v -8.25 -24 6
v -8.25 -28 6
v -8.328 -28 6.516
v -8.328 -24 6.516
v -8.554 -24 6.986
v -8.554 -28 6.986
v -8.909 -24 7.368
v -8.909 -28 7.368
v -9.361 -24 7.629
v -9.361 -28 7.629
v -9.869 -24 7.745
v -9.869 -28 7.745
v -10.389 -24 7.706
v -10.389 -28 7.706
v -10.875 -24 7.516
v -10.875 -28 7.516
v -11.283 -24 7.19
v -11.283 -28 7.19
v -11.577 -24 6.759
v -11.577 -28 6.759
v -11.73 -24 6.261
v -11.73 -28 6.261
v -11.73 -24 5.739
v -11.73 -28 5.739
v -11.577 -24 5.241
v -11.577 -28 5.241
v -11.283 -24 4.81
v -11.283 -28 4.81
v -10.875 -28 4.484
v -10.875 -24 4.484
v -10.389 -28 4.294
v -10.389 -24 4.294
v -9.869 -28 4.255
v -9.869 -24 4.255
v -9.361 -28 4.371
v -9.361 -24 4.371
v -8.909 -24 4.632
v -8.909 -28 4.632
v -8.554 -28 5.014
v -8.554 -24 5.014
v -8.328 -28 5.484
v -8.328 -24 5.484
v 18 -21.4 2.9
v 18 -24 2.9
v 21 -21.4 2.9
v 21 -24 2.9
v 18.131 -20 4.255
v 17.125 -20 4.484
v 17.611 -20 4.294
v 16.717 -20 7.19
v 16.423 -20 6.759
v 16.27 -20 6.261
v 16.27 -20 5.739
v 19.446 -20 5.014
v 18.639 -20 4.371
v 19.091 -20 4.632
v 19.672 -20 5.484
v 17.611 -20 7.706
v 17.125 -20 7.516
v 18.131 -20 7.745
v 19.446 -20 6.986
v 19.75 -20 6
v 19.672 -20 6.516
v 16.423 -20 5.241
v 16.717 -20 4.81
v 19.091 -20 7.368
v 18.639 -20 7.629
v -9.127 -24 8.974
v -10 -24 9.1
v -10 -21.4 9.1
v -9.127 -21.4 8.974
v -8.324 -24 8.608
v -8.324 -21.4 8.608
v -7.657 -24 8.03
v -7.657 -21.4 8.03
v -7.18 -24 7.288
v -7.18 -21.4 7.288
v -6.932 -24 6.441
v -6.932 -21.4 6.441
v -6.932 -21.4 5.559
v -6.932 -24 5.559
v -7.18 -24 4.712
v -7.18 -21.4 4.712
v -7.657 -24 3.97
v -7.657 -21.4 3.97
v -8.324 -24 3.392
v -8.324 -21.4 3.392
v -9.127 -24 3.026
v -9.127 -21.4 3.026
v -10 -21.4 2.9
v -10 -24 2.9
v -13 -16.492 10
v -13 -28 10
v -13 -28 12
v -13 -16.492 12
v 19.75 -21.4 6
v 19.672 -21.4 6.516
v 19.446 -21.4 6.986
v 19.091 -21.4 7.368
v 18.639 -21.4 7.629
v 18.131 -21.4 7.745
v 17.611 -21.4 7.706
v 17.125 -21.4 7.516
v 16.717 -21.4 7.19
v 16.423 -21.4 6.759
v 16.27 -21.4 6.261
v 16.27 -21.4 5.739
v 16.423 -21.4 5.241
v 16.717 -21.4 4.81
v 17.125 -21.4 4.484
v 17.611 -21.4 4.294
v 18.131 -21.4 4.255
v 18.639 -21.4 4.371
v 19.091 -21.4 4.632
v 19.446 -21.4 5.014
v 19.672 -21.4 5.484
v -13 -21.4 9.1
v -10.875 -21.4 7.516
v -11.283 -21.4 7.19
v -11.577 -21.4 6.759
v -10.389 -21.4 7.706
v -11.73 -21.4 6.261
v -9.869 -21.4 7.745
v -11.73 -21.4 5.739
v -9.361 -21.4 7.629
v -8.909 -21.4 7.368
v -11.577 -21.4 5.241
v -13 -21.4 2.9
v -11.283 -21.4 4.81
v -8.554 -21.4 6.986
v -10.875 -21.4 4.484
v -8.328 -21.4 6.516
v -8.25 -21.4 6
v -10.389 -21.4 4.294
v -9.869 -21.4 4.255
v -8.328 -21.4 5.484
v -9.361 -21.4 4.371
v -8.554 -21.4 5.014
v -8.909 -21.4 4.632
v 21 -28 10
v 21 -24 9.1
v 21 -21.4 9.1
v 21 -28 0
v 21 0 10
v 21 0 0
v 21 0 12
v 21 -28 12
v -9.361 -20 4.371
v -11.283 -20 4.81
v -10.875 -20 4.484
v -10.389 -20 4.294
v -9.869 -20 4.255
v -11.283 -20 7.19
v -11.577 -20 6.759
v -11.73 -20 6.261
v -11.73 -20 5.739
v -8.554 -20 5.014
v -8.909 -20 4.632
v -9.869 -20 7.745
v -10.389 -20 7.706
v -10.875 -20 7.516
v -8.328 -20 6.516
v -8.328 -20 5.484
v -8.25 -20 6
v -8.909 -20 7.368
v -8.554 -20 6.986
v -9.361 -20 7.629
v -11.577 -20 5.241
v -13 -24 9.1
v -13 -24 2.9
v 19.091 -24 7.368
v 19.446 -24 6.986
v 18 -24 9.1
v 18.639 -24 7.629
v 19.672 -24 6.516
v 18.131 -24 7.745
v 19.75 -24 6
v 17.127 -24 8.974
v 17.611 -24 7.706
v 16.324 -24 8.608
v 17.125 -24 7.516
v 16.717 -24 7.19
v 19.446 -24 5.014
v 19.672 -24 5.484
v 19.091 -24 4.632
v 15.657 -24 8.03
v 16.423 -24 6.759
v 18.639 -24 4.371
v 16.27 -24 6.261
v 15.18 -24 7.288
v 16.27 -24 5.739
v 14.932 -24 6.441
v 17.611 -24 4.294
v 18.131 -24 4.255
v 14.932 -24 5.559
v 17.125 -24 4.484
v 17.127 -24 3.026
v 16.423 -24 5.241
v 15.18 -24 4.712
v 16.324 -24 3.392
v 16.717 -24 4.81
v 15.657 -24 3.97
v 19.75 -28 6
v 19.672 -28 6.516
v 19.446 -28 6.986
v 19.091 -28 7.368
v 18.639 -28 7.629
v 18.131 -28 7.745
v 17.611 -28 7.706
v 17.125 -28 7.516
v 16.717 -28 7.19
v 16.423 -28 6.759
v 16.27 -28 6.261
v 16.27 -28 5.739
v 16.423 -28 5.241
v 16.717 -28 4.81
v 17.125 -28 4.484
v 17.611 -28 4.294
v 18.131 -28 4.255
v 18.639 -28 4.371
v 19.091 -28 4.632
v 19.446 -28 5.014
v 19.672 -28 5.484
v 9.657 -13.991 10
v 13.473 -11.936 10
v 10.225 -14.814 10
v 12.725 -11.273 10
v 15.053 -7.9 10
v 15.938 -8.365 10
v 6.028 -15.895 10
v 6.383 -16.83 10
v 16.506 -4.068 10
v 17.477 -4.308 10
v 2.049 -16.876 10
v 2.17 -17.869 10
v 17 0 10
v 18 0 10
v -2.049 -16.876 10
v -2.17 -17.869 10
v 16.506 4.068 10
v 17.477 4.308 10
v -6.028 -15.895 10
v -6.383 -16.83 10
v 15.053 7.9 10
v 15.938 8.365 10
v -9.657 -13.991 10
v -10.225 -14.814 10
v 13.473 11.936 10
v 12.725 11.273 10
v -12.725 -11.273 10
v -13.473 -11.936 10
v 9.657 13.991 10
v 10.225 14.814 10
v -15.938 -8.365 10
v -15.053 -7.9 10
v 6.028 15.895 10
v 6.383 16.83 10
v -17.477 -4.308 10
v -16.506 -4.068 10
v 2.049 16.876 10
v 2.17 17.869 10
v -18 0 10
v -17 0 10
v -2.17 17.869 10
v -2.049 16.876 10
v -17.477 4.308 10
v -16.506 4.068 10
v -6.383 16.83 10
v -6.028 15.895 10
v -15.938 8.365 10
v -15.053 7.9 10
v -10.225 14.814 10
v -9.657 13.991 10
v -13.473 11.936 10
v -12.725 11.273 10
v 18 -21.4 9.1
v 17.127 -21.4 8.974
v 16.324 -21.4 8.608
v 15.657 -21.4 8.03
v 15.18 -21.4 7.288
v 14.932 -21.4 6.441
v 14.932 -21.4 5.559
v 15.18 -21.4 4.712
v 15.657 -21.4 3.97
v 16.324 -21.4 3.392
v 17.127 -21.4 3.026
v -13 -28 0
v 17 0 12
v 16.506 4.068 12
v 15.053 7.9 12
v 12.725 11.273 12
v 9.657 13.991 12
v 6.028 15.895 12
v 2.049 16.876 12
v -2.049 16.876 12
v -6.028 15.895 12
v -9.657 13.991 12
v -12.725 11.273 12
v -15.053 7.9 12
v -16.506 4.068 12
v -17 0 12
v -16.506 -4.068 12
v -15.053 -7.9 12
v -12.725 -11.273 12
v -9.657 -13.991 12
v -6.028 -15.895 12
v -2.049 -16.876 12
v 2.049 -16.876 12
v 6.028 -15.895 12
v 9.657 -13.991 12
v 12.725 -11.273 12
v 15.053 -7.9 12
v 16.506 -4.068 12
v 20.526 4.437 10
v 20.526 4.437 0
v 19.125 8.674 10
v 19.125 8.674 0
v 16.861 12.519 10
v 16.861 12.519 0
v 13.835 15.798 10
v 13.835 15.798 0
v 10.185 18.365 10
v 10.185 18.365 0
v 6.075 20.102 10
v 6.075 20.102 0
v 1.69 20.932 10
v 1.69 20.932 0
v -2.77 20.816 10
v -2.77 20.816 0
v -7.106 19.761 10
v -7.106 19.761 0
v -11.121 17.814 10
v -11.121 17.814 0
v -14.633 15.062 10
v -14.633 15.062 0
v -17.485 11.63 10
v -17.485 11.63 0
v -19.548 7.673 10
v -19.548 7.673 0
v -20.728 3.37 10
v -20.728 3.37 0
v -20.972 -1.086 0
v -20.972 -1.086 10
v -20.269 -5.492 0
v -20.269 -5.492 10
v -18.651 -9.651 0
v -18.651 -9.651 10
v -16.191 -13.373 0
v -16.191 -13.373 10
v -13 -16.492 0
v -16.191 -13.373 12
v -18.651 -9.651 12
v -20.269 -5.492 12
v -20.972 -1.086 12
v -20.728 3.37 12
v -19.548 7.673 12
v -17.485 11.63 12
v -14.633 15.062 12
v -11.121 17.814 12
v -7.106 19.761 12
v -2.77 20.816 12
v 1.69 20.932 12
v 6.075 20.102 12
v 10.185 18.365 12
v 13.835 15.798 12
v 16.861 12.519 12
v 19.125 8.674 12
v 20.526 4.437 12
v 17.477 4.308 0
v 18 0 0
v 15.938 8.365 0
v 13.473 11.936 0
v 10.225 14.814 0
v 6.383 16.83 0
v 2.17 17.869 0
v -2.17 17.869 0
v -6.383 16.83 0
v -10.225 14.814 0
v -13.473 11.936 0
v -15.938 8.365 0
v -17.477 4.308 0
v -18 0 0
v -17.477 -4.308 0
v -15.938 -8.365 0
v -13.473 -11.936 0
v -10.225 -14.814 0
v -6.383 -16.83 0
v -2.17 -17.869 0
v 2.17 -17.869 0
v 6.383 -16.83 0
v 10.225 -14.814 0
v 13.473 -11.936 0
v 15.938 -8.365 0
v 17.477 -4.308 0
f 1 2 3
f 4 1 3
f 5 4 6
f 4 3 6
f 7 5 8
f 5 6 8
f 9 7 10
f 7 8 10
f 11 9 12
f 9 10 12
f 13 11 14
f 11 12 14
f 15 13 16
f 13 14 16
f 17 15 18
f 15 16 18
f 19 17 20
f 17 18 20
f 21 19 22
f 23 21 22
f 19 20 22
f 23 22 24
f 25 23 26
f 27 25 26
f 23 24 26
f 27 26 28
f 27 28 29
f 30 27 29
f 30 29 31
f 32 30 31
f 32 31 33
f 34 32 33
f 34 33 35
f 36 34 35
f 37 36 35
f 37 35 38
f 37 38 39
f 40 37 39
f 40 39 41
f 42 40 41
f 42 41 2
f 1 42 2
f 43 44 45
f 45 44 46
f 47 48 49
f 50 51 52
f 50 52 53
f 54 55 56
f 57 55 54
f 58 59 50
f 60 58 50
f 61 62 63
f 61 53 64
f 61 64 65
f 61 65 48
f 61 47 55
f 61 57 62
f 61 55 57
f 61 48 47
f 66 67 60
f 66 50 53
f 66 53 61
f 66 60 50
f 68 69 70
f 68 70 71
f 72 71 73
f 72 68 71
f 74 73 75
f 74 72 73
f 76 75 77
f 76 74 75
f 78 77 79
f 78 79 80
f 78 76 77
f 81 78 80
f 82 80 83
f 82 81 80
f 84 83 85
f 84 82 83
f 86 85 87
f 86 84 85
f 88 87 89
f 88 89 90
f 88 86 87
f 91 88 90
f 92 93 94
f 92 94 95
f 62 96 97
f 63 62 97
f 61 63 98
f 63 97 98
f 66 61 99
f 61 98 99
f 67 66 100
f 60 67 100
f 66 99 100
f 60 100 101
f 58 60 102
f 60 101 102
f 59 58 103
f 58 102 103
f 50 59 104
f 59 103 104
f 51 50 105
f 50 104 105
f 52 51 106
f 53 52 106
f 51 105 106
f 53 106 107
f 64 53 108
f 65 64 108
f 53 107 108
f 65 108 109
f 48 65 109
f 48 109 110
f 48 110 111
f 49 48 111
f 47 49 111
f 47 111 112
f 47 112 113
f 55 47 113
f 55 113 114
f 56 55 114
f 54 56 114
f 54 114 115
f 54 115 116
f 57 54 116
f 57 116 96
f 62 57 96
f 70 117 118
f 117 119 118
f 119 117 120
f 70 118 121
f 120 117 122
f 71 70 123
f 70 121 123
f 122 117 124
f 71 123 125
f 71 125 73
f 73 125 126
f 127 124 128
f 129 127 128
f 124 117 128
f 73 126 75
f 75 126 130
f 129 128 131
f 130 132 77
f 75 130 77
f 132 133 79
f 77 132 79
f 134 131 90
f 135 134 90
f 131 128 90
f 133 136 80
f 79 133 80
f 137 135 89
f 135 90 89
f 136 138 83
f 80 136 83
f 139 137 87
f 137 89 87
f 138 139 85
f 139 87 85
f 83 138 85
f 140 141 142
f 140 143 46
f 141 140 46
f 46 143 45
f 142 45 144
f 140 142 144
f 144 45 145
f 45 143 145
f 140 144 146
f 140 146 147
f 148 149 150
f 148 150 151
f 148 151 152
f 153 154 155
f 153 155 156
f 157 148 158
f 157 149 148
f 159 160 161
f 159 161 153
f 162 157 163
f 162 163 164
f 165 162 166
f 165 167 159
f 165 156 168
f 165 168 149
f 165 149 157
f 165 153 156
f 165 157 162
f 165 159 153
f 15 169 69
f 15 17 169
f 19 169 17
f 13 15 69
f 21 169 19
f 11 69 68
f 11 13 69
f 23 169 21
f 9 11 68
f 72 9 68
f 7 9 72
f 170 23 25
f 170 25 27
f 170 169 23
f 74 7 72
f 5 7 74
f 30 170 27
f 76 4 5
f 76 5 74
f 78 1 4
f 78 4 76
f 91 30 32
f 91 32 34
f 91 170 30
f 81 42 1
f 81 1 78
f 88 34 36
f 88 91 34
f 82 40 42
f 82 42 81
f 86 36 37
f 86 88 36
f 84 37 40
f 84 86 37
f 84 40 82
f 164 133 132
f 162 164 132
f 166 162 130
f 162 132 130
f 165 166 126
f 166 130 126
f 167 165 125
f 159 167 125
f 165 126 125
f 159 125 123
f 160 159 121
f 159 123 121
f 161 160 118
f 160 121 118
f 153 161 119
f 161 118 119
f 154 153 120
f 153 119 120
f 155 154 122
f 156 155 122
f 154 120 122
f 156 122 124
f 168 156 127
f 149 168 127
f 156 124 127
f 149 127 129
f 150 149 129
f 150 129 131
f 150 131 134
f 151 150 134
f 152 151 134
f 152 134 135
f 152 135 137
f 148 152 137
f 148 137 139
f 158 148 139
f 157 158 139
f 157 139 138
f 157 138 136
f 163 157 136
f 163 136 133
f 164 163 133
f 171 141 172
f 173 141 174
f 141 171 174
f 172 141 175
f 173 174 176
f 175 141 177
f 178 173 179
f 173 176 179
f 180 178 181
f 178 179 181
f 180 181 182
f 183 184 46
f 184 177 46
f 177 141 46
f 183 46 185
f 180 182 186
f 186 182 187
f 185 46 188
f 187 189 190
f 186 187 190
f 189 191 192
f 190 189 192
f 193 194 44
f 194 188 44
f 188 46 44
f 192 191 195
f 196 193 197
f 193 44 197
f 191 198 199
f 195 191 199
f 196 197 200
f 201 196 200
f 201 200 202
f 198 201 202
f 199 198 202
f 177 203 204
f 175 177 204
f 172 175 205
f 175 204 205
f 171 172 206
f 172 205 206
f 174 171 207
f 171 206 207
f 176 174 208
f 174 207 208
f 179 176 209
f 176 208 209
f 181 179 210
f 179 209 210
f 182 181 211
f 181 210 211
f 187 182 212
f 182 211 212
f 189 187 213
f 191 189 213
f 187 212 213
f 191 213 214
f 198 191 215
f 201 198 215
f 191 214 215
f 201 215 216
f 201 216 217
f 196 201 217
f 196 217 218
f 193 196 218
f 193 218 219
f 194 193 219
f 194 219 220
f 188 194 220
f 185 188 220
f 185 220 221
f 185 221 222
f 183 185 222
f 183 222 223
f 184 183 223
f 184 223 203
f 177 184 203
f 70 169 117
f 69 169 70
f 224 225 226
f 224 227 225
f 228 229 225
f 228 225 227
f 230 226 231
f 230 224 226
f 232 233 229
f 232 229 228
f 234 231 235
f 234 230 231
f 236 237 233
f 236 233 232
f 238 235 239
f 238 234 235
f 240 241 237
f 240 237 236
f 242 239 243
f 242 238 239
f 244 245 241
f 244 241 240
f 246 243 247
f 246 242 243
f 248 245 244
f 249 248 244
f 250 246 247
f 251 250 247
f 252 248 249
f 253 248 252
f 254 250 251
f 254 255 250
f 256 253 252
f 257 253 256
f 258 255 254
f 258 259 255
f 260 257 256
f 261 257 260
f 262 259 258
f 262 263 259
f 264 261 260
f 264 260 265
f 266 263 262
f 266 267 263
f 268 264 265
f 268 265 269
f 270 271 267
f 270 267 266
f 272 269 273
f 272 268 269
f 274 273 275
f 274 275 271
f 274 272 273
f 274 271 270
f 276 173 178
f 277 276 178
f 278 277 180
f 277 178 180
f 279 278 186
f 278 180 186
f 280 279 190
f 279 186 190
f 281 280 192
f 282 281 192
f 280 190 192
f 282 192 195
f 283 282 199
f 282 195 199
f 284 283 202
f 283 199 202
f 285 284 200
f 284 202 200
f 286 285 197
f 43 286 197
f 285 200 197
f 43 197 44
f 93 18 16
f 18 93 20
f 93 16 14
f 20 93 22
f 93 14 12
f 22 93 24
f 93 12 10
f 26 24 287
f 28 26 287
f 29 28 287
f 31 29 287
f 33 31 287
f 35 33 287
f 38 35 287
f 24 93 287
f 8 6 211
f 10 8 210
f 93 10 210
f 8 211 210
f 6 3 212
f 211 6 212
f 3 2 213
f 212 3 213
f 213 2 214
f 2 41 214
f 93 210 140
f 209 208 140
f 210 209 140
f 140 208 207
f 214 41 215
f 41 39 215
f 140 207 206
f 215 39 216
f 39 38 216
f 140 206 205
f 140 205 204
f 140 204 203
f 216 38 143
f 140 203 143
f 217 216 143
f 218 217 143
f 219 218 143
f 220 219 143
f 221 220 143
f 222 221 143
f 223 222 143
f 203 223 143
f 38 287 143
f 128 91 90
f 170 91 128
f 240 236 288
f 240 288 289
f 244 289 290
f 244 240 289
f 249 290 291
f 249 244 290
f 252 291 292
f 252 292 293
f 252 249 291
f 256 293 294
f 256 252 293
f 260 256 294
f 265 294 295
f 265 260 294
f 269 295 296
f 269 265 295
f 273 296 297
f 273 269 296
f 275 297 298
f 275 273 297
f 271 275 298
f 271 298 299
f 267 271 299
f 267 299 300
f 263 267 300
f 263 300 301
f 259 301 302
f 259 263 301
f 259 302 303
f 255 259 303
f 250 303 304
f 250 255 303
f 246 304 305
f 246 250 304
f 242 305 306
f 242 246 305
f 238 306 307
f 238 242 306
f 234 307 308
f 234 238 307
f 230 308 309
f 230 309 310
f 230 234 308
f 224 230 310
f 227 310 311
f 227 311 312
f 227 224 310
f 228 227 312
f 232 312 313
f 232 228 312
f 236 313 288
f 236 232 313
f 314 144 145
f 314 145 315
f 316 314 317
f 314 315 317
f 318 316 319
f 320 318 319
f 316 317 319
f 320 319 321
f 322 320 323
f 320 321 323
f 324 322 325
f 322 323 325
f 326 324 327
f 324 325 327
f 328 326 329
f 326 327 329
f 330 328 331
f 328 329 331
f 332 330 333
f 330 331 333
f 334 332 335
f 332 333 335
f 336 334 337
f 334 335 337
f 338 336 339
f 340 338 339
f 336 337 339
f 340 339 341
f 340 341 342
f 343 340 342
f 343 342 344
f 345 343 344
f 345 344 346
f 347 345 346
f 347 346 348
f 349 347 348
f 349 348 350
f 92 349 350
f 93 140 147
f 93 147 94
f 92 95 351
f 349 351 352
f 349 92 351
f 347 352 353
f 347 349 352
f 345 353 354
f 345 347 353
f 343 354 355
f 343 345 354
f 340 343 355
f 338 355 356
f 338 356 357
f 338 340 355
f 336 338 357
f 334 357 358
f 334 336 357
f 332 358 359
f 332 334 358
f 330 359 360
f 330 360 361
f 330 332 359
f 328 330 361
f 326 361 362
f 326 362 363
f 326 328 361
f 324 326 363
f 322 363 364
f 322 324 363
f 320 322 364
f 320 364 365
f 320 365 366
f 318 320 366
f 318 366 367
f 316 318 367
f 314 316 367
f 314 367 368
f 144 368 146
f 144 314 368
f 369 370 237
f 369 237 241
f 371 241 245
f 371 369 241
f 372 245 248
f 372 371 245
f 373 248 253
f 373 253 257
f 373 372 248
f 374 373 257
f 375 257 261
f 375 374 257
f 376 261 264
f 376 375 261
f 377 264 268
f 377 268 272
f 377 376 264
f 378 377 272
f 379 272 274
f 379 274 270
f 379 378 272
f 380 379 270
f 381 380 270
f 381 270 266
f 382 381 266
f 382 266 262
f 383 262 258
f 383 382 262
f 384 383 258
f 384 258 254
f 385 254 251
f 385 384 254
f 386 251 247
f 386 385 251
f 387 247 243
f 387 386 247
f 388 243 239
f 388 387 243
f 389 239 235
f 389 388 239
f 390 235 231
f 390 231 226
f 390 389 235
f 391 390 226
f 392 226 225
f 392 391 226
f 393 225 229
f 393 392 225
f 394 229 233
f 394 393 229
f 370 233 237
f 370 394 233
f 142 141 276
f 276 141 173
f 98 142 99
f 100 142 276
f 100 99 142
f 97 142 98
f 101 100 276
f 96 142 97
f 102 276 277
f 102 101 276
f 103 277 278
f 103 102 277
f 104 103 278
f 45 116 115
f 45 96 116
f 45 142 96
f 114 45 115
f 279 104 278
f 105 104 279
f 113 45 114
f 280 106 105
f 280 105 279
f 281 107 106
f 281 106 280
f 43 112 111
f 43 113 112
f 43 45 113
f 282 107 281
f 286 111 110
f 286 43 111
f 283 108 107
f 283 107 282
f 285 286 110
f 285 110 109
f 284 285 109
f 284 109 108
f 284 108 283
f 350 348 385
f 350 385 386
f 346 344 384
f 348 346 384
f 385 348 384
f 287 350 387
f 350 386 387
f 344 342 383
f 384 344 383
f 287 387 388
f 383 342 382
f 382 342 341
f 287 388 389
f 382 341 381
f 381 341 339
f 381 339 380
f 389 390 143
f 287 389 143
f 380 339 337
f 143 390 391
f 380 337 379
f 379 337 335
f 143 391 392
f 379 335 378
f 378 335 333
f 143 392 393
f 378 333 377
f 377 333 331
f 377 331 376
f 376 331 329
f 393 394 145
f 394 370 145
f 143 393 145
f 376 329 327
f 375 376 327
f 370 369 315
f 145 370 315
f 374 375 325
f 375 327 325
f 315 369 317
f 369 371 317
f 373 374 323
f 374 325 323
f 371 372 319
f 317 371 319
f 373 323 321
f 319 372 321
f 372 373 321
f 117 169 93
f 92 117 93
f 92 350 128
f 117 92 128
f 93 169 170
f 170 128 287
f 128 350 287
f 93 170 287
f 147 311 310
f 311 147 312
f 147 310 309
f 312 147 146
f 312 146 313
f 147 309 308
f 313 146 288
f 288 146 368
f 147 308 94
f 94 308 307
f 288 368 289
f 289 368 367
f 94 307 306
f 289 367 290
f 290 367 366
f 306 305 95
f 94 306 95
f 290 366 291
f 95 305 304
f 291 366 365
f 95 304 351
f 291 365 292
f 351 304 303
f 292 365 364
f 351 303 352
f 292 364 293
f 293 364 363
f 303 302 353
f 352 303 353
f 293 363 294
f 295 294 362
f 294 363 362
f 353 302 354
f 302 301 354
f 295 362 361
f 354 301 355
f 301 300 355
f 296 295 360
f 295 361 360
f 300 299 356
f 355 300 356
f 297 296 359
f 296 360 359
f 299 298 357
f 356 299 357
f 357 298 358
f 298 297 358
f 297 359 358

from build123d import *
from build123d.topology import SkipClean

# Parameters (mm, degrees)
CROQUIS1_R              = 18
SALIENTE_EXTRUIR1_DEPTH = 10
CROQUIS2_R              = 17
SALIENTE_EXTRUIR2_DEPTH = 2
CROQUIS7_R              = 1.75
CORTAR_EXTRUIR3_DEPTH   = 8
CORTAR_EXTRUIR4_DEPTH   = 2.6


with BuildPart() as part:
    # Croquis1 → Saliente-Extruir1 (new body)
    with BuildSketch(Plane.XY):
        with BuildLine():
            Line((-13, -28), (21, -28))
            Line((21, -28), (21, 0))
            ThreePointArc((21, 0), (-9.16515139, 18.894443628), (-13, -16.492422502))
            Line((-13, -16.492422502), (-13, -28))
        make_face()
        Circle(CROQUIS1_R, mode=Mode.SUBTRACT)
    extrude(amount=SALIENTE_EXTRUIR1_DEPTH)

    # Croquis2 → Saliente-Extruir2 (add)
    with SkipClean():  # the faces are left unmerged after this step: merging them gives an invalid solid
        with BuildSketch(Plane.XY.offset(10)):
            with BuildLine():
                Line((21, 0), (21, -28))
                Line((21, -28), (-13, -28))
                Line((-13, -28), (-13, -16.492422502))
                ThreePointArc((-13, -16.492422502), (-9.16515139, 18.894443628), (21, 0))
            make_face()
            Circle(CROQUIS2_R, mode=Mode.SUBTRACT)
        extrude(amount=SALIENTE_EXTRUIR2_DEPTH)

    # Croquis7 → Cortar-Extruir3 (cut)
    with SkipClean():  # the faces are left unmerged after this step: merging them gives an invalid solid
        with BuildSketch(Plane.XZ.offset(28)):
            with Locations((-10, 6)):
                Circle(CROQUIS7_R)
            with Locations((18, 6)):
                Circle(CROQUIS7_R)
        extrude(amount=-CORTAR_EXTRUIR3_DEPTH, mode=Mode.SUBTRACT)

    # Croquis8 → Cortar-Extruir4 (cut)
    with SkipClean():  # the faces are left unmerged after this step: merging them gives an invalid solid
        with BuildSketch(Plane(origin=(0, -24, 0), x_dir=(-1, 0, 0), z_dir=(0, -1, 0))):
            with BuildLine():
                Line((-18, -2.9), (-21, -2.9))
                Line((-21, -2.9), (-21, -9.1))
                Line((-21, -9.1), (-18, -9.1))
                ThreePointArc((-18, -9.1), (-14.9, -6), (-18, -2.9))
            make_face()
            with BuildLine():
                Line((10, -2.9), (13, -2.9))
                Line((13, -2.9), (13, -9.1))
                Line((13, -9.1), (10, -9.1))
                ThreePointArc((10, -9.1), (6.9, -6), (10, -2.9))
            make_face()
        extrude(amount=-CORTAR_EXTRUIR4_DEPTH, mode=Mode.SUBTRACT)


solid = part.part
